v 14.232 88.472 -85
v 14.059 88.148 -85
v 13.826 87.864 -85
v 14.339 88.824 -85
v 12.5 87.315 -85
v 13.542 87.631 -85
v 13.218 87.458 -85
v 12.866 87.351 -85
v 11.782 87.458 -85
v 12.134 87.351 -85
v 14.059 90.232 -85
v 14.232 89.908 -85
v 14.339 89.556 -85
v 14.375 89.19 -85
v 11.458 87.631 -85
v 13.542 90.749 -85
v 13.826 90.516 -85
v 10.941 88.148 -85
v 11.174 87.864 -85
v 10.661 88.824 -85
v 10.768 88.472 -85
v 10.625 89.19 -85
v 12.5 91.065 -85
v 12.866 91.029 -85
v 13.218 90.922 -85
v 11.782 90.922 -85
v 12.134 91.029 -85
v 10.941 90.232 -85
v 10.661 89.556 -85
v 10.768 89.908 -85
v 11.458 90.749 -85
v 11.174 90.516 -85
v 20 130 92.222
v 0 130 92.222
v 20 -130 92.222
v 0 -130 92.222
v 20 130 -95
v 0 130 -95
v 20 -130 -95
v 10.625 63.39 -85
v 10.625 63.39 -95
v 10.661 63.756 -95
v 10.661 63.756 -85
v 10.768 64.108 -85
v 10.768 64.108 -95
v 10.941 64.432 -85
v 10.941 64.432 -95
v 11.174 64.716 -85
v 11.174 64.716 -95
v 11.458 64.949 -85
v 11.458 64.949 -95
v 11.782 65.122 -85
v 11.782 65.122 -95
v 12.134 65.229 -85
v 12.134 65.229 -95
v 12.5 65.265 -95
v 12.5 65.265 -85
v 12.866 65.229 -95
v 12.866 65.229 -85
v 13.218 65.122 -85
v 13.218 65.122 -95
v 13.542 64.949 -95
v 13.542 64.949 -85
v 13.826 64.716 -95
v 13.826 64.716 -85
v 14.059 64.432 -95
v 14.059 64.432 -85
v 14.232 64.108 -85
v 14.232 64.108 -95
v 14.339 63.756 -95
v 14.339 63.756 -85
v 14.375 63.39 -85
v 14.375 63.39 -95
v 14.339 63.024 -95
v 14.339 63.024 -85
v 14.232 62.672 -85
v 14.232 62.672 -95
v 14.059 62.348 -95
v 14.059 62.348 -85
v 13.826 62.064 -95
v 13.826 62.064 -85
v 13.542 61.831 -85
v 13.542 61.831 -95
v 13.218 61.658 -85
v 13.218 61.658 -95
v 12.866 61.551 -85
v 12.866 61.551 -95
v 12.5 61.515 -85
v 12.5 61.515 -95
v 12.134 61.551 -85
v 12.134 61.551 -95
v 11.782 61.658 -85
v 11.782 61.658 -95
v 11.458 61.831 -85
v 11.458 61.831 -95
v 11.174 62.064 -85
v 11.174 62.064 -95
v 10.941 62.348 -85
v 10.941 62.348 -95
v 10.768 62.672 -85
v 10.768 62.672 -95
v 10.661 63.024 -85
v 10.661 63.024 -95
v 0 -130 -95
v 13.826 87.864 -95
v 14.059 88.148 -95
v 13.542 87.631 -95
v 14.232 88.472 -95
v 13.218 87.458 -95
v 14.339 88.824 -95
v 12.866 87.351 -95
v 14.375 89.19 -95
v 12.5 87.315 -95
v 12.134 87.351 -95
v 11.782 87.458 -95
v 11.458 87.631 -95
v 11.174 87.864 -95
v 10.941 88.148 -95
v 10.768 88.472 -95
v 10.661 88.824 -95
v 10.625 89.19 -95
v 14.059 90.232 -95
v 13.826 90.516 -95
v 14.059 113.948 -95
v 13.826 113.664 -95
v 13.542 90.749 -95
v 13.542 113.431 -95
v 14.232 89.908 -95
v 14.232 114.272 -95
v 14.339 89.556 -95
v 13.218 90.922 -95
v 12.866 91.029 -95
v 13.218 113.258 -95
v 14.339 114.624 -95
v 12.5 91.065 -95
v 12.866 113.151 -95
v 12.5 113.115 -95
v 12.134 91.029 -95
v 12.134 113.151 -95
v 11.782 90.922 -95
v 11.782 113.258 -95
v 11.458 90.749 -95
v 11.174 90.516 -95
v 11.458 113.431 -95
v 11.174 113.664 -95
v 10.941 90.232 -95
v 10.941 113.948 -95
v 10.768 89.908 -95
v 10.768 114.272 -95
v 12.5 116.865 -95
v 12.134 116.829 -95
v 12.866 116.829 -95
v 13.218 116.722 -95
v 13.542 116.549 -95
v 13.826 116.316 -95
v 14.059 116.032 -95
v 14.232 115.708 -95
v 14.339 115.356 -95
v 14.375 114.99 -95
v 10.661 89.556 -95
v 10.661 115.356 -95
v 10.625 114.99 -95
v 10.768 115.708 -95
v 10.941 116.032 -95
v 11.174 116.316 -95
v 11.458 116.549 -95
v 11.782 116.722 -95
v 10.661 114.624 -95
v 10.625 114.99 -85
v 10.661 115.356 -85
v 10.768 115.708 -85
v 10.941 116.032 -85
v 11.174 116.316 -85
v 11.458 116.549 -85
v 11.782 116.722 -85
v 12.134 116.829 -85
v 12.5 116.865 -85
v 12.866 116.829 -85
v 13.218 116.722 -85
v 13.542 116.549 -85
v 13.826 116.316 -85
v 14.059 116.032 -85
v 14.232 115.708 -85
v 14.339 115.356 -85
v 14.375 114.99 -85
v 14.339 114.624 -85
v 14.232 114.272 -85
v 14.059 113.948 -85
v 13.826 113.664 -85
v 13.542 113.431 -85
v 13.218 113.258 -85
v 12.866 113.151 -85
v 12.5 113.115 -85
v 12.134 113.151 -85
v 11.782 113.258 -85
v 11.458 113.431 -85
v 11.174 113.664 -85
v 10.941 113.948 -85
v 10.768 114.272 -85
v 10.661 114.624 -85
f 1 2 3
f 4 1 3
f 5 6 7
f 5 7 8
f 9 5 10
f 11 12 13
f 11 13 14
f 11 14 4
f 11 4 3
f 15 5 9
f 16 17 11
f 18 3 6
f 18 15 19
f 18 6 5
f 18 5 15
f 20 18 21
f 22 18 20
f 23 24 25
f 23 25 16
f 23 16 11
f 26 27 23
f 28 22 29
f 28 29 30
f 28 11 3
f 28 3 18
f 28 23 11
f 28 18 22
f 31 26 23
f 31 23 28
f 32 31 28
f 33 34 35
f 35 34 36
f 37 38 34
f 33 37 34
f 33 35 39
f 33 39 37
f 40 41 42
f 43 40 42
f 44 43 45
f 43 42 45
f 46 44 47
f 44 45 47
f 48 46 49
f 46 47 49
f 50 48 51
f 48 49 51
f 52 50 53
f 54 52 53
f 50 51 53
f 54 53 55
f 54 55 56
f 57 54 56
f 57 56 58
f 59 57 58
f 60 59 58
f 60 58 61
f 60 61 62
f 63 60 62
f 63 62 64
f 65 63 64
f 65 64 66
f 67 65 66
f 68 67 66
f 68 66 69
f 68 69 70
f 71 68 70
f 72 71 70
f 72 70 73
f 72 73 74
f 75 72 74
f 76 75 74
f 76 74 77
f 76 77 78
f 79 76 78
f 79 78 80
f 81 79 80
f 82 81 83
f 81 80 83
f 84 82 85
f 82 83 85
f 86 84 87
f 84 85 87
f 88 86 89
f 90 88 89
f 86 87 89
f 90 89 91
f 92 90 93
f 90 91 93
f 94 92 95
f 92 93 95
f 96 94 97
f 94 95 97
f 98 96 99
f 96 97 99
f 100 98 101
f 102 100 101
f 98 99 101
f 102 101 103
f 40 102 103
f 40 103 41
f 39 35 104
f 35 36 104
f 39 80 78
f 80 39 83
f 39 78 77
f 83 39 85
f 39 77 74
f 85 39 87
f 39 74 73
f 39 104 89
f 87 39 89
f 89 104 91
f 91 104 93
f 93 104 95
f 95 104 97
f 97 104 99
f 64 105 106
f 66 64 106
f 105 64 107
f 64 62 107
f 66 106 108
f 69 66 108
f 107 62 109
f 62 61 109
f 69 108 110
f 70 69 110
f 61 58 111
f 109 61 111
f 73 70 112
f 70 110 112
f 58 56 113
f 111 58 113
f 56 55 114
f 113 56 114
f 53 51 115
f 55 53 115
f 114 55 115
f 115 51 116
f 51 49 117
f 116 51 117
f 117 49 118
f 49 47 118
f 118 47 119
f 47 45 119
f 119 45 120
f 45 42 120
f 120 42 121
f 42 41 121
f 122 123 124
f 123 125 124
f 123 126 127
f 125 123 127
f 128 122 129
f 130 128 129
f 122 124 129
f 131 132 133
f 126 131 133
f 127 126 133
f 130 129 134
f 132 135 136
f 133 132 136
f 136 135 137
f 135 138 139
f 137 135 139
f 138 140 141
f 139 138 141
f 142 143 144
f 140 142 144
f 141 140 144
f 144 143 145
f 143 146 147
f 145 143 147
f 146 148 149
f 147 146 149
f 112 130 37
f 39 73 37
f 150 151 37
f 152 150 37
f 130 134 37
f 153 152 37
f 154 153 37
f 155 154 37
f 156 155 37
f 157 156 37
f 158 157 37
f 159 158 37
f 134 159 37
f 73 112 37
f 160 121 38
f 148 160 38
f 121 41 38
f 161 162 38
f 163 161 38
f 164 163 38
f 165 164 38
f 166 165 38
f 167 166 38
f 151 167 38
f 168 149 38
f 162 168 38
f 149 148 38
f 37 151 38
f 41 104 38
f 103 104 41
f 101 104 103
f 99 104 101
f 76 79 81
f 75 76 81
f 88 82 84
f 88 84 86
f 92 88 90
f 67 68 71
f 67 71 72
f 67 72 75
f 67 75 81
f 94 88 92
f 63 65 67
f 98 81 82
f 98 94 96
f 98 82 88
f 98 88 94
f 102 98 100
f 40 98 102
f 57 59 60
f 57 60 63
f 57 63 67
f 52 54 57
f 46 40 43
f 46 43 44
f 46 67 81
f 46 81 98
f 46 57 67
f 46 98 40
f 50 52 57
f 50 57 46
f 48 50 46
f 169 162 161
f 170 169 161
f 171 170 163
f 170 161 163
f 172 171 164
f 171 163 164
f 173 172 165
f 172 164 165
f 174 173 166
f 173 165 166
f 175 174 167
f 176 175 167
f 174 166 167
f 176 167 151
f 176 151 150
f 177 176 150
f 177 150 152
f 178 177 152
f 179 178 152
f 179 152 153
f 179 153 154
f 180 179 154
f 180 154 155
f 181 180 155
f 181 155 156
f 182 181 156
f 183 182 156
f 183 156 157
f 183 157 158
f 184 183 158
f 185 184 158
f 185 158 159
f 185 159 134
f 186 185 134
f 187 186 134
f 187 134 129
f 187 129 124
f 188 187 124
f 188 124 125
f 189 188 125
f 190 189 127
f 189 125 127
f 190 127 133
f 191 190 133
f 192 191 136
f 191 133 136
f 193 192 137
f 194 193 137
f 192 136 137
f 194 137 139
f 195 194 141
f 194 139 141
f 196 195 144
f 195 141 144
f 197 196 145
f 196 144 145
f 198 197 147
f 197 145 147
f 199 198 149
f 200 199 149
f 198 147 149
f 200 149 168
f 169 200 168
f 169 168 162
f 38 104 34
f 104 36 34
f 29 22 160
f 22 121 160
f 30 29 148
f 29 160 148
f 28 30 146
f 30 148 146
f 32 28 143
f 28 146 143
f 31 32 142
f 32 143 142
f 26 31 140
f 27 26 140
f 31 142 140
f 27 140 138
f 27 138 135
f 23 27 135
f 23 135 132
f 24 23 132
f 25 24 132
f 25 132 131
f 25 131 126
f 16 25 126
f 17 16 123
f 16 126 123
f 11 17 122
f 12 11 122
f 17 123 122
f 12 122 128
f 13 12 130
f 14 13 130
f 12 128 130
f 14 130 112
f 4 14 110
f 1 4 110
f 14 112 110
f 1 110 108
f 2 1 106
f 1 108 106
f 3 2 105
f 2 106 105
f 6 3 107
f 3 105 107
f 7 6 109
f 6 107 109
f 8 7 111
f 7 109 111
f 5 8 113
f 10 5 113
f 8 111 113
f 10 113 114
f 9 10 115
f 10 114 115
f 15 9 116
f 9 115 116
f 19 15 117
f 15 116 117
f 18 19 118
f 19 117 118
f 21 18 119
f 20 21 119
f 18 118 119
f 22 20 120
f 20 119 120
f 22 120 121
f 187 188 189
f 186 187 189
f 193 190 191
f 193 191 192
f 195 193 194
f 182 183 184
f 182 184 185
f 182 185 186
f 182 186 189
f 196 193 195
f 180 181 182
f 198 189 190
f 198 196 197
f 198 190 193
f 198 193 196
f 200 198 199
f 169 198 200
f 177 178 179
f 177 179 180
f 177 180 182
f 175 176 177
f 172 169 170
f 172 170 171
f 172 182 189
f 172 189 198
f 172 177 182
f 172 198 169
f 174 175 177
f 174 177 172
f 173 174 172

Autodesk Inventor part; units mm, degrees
ref_plane "YZ Plane" through (0, 0, 0) normal (1, 0, 0) x (0, 1, 0)
ref_plane "XZ Plane" through (0, 0, 0) normal (0, 1, 0) x (-1, 0, 0)
ref_plane "XY Plane" through (0, 0, 0) normal (0, 0, 1) x (1, 0, 0)
sketch "Sketch1" plane through (0, 0, 0) normal (1, 0, 0) x (0, 1, 0)
  line L0 (-130, 92.222) -> (-130, -95)
  line L1 (-130, -95) -> (130, -95)
  line L2 (130, -95) -> (130, 92.222)
  line L3 (130, 92.222) -> (-130, 92.222)
  point P0 (0, 0)
  dimension "d0" = 260
extrude "Extrusion1" add sketch "Sketch1" along normal blind 20
sketch "Sketch2" plane through (0, -130, -95) normal (0, 0, -1) x (-1, 0, 0)
  circle A0 centre (-12.5, 244.99) radius 1.875
  circle A1 centre (-12.5, 219.19) radius 1.875
  circle A2 centre (-12.5, 193.39) radius 1.875
  line L0 (0, 260) -> (-20, 260) projected
  line L1 (0, 0) -> (0, 260) projected
  point P0 (0, 130)
  dimension "d4" = 3.75
  dimension "d5" = 3.75
  dimension "d6" = 3.75
  dimension "d7" = 15.01
  dimension "d8" = 25.8
  dimension "d9" = 25.8
  dimension "d10" = 12.5
extrude "Extrusion2" cut sketch "Sketch2" against normal blind 10
properties part number "Battery Box Cover"
